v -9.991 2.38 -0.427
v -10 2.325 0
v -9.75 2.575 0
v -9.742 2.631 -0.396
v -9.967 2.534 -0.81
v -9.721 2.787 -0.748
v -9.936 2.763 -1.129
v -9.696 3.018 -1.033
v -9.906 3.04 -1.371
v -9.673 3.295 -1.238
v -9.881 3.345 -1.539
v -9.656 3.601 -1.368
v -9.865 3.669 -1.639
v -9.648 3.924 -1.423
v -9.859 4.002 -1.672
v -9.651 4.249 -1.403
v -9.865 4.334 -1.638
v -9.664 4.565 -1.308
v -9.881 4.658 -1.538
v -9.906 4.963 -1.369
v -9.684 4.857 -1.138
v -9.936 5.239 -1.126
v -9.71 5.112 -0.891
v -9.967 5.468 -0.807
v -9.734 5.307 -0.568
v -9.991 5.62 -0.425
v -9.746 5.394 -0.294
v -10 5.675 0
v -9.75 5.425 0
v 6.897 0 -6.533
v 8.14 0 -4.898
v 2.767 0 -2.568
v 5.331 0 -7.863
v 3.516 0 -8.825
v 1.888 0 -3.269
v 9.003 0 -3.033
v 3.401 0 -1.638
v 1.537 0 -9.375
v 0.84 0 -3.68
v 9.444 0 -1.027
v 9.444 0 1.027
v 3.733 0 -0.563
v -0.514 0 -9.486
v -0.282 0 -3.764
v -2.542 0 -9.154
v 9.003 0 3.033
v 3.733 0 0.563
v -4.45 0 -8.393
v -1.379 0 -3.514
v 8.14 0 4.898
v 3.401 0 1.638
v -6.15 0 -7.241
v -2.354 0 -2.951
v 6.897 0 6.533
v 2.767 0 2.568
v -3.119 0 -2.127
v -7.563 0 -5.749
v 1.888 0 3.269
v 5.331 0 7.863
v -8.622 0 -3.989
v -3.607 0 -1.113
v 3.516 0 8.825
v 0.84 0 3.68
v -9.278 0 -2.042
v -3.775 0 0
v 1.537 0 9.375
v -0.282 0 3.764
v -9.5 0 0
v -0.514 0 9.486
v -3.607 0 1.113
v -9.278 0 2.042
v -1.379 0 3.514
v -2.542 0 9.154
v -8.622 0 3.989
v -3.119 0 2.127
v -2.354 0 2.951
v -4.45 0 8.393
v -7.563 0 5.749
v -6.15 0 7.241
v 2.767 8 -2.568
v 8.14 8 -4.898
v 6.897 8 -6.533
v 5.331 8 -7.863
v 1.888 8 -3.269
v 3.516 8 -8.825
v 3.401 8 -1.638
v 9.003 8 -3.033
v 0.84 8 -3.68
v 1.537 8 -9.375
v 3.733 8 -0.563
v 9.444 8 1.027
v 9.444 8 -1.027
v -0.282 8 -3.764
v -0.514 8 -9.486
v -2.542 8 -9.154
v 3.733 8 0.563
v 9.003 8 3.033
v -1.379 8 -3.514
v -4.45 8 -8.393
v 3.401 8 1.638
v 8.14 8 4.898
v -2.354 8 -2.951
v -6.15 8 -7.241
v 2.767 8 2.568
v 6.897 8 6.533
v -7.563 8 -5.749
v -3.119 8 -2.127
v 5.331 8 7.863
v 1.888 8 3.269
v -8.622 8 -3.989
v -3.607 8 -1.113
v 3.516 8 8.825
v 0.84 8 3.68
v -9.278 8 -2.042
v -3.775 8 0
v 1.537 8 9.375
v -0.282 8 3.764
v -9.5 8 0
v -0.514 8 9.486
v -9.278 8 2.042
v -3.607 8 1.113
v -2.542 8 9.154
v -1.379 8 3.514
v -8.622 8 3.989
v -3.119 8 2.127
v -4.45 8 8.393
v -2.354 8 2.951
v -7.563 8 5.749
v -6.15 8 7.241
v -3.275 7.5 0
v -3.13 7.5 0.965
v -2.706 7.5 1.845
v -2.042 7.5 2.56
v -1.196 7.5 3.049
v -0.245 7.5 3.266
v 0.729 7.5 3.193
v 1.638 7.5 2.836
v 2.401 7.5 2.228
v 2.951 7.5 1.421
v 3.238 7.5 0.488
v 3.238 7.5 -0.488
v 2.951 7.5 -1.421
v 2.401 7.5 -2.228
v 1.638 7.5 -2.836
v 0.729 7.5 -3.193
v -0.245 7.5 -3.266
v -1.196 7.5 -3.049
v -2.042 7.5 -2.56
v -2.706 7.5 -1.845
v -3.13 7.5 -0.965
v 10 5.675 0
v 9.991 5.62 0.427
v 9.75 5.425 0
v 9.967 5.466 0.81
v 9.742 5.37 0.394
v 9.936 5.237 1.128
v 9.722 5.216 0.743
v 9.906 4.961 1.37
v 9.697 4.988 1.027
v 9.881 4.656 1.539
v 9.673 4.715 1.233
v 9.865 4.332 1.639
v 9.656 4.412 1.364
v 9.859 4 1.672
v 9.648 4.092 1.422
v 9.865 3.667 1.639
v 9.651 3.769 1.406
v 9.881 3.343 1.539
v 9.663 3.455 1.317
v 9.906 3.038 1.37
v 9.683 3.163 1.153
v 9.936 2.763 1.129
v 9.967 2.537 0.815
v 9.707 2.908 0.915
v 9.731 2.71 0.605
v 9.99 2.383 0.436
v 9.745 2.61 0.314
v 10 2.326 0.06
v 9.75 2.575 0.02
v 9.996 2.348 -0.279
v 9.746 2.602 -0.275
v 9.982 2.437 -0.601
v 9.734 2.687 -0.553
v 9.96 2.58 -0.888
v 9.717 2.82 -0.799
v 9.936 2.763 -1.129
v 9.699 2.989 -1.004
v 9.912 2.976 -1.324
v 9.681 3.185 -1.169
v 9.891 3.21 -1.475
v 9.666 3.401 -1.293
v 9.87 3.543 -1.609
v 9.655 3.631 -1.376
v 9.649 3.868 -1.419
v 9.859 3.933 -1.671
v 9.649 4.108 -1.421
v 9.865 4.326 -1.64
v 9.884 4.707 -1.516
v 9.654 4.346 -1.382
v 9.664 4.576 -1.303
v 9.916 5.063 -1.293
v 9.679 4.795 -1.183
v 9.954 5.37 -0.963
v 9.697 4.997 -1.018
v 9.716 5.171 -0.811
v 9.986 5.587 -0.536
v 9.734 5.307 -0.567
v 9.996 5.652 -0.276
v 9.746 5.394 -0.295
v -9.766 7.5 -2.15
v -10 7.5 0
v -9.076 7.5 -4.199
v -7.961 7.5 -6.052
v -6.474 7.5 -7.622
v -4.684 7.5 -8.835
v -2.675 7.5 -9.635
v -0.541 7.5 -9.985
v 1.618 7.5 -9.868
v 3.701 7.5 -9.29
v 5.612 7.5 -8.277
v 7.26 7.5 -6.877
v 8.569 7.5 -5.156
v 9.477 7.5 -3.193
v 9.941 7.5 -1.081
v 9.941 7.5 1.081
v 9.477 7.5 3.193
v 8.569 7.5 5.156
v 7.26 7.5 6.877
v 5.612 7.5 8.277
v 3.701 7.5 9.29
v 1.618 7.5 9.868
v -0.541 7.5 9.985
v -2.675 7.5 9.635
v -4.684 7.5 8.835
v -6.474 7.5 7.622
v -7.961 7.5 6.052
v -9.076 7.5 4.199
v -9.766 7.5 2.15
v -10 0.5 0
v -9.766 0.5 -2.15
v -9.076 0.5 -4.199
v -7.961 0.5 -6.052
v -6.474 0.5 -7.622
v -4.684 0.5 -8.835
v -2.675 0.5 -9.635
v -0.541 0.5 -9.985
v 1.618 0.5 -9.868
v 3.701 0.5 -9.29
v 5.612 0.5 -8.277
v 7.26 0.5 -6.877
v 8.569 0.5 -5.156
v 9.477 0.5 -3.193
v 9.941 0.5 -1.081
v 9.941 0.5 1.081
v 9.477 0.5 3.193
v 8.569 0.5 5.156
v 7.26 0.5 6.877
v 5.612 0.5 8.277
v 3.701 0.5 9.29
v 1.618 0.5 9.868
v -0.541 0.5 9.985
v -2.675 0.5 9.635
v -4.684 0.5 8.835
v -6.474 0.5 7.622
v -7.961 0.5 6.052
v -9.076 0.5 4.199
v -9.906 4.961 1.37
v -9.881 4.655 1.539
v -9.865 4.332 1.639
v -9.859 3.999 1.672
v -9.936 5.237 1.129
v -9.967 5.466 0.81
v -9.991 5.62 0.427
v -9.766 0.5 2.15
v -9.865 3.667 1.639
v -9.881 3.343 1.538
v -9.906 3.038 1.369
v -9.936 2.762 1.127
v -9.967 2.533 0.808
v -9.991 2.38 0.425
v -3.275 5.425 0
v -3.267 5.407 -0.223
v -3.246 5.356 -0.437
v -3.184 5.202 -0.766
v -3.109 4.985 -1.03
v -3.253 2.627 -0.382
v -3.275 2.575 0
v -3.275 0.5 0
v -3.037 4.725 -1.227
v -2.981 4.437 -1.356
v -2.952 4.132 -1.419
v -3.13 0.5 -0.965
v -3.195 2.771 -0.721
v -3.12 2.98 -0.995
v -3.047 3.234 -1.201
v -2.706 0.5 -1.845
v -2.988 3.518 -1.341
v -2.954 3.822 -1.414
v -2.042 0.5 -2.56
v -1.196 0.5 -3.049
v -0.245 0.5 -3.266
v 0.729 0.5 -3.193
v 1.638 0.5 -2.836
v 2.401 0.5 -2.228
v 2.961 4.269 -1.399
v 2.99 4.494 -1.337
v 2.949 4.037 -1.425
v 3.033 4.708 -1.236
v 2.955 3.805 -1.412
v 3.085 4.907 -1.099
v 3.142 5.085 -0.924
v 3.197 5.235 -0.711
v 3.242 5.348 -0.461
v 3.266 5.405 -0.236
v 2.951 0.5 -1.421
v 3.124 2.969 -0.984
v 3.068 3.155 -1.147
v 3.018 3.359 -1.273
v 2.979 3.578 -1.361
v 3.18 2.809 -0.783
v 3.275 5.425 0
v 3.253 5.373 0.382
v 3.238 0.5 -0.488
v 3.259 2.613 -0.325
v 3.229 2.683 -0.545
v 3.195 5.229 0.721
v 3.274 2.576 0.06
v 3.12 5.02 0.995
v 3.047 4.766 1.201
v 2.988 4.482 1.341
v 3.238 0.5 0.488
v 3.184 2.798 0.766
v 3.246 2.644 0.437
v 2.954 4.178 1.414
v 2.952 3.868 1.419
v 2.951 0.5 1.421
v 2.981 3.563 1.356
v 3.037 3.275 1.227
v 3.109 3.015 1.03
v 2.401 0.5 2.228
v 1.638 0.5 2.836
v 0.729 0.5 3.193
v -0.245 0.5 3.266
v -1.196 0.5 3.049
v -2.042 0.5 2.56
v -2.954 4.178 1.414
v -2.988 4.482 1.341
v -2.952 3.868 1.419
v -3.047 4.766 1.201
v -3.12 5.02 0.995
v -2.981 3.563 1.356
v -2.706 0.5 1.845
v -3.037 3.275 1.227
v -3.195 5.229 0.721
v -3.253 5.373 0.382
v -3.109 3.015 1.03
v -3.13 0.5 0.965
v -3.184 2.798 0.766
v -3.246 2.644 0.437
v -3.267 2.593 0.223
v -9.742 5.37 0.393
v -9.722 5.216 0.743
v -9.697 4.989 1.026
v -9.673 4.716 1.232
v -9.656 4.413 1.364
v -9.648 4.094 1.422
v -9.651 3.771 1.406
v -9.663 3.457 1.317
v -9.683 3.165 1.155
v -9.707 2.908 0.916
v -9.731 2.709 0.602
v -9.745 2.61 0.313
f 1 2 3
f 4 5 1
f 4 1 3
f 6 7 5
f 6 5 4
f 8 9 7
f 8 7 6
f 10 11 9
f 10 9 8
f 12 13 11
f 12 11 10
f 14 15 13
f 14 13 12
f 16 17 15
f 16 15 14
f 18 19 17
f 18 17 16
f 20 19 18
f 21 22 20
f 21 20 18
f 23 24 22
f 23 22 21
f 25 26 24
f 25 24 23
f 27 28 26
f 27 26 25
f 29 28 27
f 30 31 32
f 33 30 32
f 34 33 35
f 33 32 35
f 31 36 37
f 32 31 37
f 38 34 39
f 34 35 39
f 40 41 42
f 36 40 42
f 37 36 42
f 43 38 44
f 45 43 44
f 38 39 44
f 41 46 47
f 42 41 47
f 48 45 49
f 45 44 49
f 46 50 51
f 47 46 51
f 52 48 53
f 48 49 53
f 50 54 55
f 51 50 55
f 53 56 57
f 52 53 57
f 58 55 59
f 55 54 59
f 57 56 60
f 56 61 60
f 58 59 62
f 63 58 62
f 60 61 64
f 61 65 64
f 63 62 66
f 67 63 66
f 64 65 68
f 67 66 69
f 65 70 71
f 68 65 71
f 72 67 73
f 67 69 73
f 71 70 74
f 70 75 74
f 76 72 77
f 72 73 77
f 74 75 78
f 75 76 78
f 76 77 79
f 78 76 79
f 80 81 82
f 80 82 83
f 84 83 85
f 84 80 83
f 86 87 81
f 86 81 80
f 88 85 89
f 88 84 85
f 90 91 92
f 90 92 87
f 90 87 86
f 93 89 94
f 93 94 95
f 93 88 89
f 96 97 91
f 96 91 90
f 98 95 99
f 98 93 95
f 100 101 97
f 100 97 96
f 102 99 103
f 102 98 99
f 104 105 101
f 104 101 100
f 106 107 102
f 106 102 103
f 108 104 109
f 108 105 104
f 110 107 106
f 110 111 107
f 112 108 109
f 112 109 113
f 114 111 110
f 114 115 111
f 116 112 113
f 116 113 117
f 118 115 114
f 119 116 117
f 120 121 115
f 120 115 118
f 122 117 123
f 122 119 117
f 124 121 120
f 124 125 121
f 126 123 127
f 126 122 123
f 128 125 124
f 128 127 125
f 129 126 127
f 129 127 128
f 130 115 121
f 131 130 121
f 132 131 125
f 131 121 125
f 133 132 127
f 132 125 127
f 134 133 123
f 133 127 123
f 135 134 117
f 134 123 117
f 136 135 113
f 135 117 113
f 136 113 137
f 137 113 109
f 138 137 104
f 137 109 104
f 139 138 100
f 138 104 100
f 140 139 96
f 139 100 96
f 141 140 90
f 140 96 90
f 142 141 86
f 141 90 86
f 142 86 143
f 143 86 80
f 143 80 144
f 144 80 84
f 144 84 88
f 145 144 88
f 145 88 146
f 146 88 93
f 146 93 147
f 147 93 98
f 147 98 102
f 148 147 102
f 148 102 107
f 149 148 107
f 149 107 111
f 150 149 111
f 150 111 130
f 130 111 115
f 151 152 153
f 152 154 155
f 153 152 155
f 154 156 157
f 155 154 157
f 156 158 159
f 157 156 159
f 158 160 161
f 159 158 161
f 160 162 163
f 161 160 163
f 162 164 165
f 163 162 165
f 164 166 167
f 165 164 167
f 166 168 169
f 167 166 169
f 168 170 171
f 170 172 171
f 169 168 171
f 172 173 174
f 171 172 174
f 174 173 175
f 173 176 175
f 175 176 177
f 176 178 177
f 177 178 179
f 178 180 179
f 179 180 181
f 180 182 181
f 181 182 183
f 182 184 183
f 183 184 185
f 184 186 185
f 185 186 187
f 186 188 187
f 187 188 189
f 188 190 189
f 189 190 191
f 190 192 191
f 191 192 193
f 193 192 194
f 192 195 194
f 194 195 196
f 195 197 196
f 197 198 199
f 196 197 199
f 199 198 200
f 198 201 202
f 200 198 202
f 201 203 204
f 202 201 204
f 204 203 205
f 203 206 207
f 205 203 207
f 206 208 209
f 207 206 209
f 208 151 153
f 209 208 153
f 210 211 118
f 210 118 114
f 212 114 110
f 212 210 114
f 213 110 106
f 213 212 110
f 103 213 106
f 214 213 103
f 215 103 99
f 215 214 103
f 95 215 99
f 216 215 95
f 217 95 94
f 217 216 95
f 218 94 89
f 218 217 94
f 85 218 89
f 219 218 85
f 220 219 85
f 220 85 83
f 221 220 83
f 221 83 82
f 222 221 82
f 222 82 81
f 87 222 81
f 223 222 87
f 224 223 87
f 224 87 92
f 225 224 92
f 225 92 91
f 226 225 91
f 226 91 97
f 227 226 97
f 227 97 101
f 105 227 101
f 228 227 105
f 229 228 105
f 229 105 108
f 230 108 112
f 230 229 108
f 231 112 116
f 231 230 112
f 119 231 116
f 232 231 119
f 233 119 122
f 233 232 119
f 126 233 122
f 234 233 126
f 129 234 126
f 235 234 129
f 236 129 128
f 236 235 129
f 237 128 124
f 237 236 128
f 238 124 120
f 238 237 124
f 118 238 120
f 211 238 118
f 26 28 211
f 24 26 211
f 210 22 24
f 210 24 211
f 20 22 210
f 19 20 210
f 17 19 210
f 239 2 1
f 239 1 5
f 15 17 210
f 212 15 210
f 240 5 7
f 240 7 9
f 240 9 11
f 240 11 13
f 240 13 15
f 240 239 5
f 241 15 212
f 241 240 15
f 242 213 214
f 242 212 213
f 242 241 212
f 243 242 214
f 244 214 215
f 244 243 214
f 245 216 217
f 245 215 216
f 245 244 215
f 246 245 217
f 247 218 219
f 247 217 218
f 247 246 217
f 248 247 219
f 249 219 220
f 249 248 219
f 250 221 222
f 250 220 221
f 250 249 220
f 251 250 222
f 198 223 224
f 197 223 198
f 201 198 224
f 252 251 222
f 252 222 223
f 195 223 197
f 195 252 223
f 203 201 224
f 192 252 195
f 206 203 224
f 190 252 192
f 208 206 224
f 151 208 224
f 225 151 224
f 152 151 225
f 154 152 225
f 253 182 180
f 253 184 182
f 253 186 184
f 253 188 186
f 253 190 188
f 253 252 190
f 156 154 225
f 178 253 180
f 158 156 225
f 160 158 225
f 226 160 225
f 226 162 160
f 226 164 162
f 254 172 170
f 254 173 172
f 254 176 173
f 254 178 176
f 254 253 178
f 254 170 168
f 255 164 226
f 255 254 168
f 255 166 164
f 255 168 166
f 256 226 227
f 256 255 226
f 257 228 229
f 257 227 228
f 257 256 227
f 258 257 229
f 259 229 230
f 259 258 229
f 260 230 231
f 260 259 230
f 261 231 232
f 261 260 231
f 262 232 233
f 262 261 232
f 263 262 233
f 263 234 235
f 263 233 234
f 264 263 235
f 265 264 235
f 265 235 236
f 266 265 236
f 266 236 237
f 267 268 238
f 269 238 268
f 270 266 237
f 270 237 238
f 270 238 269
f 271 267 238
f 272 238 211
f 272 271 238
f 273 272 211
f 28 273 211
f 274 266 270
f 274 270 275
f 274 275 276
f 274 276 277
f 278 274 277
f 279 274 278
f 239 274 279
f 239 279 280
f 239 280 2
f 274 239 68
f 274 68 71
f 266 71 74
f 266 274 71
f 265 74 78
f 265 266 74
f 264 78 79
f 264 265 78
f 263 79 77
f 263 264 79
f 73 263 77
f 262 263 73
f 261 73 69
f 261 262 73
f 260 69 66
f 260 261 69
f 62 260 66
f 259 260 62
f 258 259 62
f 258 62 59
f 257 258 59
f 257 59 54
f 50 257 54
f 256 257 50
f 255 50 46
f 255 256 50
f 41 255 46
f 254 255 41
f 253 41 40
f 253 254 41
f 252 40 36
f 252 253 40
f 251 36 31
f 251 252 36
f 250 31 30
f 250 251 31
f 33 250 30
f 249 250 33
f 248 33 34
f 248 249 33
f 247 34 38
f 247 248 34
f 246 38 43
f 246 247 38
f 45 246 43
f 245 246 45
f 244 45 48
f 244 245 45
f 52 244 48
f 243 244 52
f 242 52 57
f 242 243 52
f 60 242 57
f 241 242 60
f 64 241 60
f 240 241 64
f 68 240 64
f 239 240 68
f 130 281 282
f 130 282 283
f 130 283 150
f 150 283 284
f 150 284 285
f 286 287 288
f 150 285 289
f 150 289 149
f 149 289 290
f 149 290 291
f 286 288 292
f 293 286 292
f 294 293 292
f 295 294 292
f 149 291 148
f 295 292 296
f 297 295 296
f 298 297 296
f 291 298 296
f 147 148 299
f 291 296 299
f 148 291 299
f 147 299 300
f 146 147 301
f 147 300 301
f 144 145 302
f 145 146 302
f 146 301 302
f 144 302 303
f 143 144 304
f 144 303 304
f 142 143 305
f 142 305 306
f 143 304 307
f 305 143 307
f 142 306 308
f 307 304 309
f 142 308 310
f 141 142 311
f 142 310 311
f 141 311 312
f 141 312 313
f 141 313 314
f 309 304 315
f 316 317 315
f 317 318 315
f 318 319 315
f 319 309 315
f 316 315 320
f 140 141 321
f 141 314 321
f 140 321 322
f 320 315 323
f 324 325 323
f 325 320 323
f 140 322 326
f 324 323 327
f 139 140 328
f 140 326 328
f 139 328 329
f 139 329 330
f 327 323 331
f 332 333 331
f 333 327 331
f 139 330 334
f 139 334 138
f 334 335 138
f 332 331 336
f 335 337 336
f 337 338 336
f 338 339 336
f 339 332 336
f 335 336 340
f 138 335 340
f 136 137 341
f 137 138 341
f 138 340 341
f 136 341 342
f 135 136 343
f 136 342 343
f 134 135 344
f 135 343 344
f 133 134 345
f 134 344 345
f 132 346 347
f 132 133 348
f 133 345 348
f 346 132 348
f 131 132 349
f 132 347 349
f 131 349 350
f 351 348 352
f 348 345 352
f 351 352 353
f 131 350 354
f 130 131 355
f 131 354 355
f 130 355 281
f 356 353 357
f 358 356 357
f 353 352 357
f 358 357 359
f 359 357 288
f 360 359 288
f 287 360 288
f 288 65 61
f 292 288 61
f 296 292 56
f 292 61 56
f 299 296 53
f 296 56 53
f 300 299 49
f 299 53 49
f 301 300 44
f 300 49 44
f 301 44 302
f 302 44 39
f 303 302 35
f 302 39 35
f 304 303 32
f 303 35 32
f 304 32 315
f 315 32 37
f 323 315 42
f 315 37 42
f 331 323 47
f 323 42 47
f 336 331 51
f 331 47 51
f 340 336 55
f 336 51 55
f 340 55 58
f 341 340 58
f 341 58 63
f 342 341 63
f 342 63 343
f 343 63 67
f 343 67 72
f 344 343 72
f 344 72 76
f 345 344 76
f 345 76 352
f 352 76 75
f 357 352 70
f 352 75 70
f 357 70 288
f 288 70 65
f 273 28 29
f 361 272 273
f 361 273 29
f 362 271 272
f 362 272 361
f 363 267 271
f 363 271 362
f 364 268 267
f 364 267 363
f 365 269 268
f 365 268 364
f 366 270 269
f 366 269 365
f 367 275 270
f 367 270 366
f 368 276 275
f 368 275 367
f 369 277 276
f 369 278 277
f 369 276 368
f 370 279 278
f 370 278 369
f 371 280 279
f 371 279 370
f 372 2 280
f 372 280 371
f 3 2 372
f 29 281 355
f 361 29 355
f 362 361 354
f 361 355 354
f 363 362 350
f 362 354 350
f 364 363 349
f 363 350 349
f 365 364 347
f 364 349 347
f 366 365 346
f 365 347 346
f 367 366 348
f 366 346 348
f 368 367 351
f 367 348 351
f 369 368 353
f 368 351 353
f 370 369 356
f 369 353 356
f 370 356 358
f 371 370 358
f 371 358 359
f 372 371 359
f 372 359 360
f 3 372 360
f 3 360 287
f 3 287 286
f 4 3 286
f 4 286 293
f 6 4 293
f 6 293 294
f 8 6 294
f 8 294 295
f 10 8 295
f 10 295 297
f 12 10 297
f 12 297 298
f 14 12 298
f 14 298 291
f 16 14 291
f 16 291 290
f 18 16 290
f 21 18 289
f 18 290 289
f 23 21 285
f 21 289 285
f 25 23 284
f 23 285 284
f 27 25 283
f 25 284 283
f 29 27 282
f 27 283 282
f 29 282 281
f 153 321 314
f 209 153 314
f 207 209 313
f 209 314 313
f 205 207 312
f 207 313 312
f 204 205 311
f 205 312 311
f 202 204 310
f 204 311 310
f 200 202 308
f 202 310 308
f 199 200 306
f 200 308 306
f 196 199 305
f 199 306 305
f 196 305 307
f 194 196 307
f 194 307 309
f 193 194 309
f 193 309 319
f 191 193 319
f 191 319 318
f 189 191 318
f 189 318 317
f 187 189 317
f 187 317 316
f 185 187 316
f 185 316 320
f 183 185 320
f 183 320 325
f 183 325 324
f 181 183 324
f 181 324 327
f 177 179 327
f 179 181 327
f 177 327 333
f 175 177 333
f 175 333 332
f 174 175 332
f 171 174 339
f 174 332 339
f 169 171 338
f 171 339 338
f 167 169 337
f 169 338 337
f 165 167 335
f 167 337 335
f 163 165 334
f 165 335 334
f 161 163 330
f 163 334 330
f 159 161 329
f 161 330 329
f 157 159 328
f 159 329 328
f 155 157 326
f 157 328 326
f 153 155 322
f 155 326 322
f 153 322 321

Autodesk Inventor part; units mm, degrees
ref_plane "YZ Plane" through (0, 0, 0) normal (1, 0, 0) x (0, 1, 0)
ref_plane "XZ Plane" through (0, 0, 0) normal (0, 1, 0) x (-1, 0, 0)
ref_plane "XY Plane" through (0, 0, 0) normal (0, 0, 1) x (1, 0, 0)
sketch "Sketch1" plane through (0, 0, 0) normal (0, 1, 0) x (-1, 0, 0)
  circle A0 centre (0, 0) radius 3.275
  circle A1 centre (0, 0) radius 10
  dimension "d0" = 6.55
  dimension "d1" = 20
extrude "Extrusion1" add sketch "Sketch1" along normal blind 8
chamfer "Chamfer1" distance 0.5 angle 45 4 edges at (10, 8, 0) (10, 0, 0) (3.275, 0, 0) (3.275, 8, 0)
sketch "Sketch2" plane through (0, 0, 0) normal (1, 0, 0) x (0, 1, 0)
  circle A0 centre (4, 0) radius 1.425
  line L0 (8, 3.275) -> (8, -3.275) projected
  line L1 (0, -3.275) -> (0, 3.275) projected
  line L2 (0, 0) -> (8, 0) construction
  dimension "d7" = 2.85
extrude "Extrusion2" cut sketch "Sketch2" along normal through all both and the other way through all
chamfer "Chamfer2" distance 0.25 angle 45 3 edges at (-9.8979, 4.0001, 1.425) (-9.8979, 4, -1.425) (10, 2.5751, -0.0175)
properties part number "nylonClamp"
